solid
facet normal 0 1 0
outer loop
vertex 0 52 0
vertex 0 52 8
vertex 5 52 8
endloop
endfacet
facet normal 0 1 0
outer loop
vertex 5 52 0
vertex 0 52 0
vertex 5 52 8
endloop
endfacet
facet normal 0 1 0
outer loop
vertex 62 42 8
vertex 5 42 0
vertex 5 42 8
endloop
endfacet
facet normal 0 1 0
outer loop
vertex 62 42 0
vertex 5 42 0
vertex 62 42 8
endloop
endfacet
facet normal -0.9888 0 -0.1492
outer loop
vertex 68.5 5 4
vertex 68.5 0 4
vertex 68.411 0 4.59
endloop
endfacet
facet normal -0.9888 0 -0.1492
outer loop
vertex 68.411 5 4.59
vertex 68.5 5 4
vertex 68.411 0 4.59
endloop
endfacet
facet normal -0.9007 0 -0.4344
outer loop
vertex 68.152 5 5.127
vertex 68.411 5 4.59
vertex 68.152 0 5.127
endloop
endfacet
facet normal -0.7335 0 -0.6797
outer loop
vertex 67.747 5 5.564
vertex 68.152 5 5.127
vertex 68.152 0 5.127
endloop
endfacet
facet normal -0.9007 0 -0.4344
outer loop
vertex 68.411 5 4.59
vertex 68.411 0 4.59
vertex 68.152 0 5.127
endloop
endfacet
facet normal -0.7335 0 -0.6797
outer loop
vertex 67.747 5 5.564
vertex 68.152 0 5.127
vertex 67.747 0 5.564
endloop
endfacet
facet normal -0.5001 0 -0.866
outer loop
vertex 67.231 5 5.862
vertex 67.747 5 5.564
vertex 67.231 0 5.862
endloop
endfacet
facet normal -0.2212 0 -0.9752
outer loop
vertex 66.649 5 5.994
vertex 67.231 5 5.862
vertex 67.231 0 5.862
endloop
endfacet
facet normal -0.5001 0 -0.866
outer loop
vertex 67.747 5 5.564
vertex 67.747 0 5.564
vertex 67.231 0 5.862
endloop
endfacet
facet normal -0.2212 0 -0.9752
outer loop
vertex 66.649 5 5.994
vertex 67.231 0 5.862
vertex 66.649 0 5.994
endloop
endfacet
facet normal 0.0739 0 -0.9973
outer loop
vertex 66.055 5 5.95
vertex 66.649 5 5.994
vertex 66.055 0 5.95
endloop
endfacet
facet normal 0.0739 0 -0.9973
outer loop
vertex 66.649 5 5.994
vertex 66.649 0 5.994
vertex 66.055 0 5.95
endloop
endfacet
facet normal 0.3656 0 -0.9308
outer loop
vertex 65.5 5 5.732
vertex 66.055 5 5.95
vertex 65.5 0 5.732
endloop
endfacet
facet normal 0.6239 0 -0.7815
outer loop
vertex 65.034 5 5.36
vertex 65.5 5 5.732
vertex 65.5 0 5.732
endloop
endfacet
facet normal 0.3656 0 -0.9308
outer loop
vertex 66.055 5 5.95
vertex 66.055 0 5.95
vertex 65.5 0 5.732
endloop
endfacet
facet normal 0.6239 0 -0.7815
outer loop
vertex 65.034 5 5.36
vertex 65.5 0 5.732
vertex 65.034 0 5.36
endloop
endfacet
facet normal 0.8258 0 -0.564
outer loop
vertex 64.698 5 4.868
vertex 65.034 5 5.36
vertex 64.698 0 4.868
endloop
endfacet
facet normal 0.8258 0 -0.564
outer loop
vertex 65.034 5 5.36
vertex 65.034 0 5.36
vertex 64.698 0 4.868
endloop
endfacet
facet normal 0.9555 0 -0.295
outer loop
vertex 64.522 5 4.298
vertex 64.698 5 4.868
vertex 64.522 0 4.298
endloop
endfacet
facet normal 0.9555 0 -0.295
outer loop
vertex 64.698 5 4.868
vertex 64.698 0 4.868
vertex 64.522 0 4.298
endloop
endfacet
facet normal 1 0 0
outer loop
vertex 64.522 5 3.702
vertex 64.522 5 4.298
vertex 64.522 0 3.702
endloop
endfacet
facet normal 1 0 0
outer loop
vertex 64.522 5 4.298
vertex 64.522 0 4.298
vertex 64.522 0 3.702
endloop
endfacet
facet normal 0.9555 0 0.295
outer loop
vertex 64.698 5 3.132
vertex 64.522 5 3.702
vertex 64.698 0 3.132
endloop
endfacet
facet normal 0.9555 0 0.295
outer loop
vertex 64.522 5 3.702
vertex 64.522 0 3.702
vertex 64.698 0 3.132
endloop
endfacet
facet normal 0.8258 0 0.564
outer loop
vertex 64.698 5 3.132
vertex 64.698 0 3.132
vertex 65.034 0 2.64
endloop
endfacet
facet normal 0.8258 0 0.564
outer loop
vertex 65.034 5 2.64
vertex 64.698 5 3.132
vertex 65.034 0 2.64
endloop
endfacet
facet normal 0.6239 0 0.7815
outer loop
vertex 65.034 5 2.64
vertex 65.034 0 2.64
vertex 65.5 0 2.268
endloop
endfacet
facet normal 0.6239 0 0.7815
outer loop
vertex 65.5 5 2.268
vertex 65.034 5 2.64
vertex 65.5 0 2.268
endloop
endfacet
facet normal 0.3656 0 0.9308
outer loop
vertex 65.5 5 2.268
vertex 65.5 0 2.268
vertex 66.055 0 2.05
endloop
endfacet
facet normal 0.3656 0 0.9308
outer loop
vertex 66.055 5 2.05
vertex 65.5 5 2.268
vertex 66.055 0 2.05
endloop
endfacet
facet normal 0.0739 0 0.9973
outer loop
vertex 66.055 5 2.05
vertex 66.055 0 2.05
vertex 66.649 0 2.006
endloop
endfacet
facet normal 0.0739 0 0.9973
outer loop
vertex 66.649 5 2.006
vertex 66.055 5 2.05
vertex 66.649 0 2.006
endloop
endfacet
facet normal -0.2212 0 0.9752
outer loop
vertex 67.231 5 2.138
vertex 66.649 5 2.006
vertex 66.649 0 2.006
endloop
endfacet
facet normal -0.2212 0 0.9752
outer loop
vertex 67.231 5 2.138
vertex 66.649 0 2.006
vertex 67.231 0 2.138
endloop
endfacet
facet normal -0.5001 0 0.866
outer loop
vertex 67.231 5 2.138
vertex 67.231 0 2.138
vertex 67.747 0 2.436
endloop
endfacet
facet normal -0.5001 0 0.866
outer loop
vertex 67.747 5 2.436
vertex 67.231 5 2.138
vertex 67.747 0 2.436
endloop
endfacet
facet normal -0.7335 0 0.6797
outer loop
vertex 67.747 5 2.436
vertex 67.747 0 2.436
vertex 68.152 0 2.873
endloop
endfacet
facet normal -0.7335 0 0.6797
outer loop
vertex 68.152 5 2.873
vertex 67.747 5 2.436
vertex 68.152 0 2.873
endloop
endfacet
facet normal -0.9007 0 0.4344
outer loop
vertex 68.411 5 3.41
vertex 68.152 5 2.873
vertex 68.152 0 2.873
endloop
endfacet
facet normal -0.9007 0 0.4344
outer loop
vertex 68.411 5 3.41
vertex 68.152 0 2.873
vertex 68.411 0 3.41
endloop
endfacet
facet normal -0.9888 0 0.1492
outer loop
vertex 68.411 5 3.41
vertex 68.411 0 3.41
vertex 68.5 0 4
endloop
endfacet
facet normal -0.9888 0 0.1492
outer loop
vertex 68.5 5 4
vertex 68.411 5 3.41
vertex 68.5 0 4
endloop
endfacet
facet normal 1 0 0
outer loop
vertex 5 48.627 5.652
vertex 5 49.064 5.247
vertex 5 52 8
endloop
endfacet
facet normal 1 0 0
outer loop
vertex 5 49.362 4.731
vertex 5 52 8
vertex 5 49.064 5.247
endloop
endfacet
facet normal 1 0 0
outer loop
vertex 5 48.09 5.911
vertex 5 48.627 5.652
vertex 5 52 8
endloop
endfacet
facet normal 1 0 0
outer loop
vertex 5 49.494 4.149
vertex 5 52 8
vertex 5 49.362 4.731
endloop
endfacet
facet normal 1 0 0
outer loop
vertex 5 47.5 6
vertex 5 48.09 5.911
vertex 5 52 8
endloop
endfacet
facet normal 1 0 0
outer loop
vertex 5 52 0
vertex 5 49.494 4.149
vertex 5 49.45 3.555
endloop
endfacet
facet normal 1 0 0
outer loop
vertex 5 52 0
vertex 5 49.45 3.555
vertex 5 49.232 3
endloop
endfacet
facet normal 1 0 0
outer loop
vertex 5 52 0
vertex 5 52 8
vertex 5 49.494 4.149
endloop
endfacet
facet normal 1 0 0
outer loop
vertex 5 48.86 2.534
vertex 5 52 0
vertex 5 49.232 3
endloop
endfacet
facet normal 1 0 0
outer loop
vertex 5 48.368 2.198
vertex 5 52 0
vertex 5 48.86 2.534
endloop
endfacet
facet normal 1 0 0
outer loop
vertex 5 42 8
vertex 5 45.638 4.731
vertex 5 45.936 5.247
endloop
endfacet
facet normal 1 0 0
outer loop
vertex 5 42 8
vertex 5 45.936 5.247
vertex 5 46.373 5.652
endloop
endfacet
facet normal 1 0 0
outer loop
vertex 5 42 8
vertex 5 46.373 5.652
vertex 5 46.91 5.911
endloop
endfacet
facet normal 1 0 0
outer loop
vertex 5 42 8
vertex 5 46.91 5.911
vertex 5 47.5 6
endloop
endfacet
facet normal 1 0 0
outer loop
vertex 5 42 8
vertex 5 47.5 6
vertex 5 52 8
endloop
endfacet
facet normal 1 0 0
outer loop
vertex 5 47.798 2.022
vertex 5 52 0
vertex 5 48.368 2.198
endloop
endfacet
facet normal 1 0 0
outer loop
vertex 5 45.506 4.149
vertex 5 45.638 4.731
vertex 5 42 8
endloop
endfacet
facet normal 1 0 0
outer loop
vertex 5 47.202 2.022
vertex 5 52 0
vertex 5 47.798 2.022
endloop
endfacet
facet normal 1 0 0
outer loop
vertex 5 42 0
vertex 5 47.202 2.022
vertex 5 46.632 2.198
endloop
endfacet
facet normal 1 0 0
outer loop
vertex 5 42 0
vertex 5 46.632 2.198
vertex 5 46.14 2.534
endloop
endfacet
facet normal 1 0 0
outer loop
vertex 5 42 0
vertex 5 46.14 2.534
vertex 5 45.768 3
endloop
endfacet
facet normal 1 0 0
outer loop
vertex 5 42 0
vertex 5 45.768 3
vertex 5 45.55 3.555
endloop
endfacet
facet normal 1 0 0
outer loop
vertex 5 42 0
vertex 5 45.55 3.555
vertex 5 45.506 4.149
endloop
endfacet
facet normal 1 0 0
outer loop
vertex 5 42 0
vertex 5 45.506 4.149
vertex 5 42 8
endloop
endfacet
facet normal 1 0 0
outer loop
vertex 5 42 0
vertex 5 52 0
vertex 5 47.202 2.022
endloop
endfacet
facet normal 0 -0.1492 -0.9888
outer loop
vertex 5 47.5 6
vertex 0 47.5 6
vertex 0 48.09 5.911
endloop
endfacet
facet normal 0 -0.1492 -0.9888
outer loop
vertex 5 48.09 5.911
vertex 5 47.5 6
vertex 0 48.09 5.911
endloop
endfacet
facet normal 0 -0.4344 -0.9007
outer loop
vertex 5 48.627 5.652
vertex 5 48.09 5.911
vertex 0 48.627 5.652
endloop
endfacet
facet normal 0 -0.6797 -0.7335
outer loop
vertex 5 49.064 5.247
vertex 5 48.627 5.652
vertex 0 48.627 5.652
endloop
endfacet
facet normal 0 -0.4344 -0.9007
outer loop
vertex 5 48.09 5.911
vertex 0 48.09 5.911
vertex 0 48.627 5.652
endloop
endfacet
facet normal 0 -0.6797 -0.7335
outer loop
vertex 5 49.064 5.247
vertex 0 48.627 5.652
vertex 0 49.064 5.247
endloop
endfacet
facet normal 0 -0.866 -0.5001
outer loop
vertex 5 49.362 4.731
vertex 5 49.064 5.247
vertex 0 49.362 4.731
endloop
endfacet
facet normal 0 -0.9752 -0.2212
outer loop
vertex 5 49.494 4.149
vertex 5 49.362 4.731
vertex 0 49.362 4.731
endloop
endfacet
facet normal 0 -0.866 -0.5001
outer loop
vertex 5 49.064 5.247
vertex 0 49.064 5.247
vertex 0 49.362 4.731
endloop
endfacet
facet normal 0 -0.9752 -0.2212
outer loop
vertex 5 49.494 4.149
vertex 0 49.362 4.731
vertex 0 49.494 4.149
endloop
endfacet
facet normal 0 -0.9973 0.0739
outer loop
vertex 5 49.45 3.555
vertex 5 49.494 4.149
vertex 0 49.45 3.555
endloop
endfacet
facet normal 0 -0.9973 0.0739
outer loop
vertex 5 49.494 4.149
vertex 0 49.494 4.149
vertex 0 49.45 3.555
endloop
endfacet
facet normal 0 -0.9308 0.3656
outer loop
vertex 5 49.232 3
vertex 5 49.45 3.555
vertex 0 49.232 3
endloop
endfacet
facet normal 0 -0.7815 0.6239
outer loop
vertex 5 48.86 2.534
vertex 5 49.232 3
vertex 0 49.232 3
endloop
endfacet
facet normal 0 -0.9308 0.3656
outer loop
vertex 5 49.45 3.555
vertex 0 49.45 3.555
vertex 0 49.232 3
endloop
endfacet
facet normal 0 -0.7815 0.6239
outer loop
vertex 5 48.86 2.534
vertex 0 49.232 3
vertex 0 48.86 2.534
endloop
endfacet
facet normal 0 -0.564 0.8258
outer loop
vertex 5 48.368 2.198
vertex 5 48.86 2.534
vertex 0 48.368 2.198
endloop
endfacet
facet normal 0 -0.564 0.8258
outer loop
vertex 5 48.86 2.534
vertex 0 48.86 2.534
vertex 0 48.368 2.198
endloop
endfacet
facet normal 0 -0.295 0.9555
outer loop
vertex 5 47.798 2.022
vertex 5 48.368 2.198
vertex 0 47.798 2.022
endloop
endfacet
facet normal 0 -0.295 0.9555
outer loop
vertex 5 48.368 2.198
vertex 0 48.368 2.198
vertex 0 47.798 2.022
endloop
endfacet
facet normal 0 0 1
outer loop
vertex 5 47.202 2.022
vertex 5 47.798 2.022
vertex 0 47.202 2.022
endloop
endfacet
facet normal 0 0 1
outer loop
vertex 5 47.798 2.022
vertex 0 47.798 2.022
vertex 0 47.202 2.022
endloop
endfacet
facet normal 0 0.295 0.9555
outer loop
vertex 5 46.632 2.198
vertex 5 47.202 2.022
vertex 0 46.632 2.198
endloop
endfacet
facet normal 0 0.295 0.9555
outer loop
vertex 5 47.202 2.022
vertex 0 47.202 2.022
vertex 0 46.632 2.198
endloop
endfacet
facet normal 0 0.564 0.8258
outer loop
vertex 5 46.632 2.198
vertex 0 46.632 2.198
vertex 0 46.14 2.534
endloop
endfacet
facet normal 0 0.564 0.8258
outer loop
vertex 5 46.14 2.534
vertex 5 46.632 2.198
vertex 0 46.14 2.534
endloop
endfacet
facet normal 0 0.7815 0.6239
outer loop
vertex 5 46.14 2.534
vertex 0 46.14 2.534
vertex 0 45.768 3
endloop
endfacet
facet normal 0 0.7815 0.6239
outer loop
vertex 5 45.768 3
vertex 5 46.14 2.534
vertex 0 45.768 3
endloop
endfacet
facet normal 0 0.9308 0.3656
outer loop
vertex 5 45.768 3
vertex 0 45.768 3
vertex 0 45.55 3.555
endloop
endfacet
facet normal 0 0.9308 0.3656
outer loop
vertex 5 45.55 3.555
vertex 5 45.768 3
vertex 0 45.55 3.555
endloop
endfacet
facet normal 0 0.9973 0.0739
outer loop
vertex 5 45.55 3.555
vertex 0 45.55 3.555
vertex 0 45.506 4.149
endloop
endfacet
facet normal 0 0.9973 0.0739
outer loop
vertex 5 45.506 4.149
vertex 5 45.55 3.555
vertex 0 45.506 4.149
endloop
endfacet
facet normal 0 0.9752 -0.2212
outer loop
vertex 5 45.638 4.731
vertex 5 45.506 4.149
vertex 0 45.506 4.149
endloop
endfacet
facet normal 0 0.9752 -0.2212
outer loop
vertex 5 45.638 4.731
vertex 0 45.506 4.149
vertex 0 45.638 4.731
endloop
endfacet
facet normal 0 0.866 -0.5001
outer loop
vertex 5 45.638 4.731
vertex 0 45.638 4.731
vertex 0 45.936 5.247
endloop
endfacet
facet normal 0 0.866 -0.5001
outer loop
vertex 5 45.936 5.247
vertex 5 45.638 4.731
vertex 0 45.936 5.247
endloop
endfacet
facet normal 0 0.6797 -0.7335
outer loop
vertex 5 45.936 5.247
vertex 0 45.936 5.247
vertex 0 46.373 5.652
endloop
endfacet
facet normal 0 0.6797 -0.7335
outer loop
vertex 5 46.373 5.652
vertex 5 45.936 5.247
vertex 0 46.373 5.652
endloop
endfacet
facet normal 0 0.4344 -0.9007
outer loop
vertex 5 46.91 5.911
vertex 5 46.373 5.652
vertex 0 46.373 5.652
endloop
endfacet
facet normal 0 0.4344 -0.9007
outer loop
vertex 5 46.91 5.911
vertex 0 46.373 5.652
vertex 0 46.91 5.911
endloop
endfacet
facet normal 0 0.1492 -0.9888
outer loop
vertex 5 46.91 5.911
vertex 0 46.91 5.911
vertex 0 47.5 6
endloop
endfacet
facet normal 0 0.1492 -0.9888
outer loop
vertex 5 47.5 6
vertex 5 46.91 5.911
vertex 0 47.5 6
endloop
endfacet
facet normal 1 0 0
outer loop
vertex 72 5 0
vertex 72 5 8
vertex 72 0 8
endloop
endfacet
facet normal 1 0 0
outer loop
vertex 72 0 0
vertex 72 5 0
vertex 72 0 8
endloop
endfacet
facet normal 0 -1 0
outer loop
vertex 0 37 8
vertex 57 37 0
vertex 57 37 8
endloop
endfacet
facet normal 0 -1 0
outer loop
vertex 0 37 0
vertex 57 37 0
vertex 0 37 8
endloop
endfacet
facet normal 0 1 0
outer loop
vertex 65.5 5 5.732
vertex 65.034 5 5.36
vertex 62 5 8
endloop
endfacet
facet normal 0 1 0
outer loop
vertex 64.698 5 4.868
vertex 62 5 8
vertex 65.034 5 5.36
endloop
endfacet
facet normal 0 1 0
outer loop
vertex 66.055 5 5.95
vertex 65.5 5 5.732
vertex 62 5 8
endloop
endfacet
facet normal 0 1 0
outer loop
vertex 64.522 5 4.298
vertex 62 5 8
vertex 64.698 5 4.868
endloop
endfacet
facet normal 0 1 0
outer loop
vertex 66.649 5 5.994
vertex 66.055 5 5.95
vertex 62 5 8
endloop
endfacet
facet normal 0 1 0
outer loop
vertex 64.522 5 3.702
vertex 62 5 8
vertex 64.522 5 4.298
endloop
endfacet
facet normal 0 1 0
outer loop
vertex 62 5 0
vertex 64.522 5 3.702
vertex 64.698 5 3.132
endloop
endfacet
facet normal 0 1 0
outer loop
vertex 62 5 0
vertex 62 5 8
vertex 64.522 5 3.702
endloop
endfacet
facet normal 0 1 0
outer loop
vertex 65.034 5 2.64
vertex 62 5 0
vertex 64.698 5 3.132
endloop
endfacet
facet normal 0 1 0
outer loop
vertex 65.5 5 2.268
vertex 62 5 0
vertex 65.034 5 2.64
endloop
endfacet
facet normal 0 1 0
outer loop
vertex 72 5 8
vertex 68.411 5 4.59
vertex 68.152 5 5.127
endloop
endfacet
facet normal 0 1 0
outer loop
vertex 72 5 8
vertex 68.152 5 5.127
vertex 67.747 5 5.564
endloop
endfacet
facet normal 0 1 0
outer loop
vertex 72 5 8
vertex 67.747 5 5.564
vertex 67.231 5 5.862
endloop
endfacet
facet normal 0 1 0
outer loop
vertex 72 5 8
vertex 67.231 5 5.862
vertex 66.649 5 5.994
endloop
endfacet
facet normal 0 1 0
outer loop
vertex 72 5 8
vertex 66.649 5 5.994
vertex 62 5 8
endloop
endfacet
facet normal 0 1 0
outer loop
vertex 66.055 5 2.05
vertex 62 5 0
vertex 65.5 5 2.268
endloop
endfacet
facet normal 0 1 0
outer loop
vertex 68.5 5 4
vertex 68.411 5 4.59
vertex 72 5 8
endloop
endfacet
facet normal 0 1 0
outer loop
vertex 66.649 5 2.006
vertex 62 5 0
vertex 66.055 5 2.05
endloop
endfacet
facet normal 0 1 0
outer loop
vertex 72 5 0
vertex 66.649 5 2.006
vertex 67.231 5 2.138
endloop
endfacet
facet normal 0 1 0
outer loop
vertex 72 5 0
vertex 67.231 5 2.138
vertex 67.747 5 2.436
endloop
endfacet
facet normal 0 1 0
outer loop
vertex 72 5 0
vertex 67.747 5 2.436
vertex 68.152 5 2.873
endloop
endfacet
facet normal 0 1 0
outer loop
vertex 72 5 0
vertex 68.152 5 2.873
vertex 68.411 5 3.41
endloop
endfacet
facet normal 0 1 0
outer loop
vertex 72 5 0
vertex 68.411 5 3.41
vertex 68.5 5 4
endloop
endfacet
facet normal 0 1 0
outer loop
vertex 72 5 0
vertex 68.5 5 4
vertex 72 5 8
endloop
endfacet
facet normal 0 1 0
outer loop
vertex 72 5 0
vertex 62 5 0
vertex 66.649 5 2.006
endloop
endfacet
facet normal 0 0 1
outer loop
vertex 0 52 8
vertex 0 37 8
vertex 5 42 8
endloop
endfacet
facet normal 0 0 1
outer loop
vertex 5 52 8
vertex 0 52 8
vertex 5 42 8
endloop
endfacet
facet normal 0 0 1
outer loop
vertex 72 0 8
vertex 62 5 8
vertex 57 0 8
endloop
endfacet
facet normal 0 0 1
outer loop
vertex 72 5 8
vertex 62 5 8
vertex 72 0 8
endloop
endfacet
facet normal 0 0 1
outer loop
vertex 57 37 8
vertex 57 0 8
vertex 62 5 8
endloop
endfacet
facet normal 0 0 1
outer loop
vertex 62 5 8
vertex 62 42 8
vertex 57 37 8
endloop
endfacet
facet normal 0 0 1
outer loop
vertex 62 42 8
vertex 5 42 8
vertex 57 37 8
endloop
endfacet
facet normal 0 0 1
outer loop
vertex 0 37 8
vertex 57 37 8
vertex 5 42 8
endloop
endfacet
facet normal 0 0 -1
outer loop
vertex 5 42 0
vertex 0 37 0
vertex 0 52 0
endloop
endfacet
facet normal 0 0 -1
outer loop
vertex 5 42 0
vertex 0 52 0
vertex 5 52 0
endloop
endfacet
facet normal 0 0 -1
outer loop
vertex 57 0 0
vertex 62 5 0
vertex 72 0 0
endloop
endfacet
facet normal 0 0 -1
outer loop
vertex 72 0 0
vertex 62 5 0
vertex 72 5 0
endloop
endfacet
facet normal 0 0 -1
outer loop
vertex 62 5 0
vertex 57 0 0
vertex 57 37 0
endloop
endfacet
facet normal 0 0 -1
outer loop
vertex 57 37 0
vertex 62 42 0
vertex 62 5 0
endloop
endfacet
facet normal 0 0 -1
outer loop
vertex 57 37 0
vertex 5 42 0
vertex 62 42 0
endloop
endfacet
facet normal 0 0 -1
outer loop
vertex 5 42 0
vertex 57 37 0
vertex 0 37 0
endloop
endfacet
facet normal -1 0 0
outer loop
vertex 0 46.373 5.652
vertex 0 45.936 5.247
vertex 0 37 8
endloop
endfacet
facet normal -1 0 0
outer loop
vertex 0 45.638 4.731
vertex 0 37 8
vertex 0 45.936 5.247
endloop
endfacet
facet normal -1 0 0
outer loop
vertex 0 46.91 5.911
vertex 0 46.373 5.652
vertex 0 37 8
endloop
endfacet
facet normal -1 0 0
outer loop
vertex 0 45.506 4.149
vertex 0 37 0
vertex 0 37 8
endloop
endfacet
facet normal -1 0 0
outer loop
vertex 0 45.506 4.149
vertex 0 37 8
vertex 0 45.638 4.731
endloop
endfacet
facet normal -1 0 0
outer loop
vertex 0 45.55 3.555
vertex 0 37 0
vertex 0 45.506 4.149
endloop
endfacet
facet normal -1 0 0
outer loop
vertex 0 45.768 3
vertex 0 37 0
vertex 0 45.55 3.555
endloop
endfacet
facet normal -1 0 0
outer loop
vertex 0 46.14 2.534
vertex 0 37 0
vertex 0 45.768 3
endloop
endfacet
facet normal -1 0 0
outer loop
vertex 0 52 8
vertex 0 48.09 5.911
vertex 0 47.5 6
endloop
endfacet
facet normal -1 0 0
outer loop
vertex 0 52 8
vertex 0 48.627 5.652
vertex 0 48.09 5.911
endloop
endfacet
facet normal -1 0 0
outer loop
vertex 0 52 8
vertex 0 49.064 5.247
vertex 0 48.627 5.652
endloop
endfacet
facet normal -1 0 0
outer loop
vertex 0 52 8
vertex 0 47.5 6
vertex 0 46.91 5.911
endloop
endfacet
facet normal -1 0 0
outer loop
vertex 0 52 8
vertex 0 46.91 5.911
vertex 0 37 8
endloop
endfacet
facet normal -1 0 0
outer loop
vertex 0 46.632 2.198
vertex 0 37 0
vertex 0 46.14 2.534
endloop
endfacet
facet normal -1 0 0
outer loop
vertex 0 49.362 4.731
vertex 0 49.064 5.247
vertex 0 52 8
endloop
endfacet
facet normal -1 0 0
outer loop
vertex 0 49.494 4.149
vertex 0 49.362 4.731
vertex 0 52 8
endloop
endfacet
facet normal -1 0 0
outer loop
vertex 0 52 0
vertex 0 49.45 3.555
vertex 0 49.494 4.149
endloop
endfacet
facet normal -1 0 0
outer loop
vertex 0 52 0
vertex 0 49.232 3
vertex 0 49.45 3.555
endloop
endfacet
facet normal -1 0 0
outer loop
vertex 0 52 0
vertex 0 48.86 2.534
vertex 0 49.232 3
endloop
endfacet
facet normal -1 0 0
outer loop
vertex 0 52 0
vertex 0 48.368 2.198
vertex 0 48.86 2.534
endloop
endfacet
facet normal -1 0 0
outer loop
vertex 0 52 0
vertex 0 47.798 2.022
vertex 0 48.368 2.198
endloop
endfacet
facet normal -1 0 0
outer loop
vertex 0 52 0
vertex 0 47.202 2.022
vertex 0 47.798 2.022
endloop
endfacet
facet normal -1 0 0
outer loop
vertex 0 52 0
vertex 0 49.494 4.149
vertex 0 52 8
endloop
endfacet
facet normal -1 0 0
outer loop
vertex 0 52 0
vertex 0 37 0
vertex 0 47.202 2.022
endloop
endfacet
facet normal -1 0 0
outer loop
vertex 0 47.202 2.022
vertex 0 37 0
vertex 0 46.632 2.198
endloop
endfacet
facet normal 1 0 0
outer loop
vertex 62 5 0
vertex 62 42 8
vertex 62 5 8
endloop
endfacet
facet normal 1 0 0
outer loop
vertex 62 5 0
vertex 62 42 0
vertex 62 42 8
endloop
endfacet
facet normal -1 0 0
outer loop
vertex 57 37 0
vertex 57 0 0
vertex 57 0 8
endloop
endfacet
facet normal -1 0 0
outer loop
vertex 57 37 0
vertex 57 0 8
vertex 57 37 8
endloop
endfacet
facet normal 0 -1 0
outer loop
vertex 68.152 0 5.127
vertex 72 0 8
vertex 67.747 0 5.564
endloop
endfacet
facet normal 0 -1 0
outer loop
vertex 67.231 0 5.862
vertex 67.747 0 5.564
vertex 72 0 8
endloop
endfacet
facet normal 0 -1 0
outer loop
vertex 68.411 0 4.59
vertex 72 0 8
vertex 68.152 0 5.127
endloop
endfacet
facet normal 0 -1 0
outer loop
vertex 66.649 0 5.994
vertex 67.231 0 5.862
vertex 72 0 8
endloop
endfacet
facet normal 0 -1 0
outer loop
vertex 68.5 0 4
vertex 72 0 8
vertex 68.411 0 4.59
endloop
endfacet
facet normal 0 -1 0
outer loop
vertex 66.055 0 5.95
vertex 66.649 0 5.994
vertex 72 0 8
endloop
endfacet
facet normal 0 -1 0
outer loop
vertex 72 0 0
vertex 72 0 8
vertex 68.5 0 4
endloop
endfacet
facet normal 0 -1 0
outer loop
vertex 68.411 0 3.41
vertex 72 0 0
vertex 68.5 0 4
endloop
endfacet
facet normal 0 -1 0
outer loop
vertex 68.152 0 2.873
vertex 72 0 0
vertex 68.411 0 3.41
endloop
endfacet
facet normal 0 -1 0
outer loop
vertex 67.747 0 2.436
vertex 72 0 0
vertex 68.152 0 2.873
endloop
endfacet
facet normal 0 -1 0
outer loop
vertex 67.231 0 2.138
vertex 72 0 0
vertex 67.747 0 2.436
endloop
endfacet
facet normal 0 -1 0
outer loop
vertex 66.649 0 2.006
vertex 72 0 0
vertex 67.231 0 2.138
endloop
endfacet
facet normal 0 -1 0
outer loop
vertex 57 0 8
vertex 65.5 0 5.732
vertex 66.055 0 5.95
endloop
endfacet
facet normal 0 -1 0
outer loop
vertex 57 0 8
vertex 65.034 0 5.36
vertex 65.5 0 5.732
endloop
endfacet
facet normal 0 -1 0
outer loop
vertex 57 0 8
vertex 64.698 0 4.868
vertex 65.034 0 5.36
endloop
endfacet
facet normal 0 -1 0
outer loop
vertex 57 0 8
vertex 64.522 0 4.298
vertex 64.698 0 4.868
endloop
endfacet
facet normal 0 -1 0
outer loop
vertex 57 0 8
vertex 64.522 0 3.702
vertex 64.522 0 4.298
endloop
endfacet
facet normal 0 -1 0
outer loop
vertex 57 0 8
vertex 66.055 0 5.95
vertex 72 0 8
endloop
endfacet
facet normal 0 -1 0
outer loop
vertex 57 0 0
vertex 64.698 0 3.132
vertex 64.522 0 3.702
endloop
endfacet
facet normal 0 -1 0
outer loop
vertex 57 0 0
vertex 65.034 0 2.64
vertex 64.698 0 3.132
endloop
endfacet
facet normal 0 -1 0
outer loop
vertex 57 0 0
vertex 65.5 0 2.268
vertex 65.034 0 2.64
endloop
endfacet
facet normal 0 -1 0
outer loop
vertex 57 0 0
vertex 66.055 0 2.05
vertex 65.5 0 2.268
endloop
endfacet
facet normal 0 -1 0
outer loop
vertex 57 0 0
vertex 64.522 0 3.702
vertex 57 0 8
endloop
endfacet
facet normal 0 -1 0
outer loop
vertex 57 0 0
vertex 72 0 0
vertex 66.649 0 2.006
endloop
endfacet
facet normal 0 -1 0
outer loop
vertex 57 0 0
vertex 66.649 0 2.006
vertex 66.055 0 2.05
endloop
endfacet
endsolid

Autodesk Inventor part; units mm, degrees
ref_plane "YZ Plane" through (0, 0, 0) normal (1, 0, 0) x (0, 1, 0)
ref_plane "XZ Plane" through (0, 0, 0) normal (0, 1, 0) x (-1, 0, 0)
ref_plane "XY Plane" through (0, 0, 0) normal (0, 0, 1) x (1, 0, 0)
sketch "Sketch1" plane through (0, 0, 0) normal (0, 0, 1) x (1, 0, 0)
  line L0 (0, 37) -> (0, 52)
  line L1 (0, 52) -> (5, 52)
  line L2 (5, 52) -> (5, 42)
  line L3 (5, 42) -> (62, 42)
  line L4 (62, 42) -> (62, 5)
  line L5 (62, 5) -> (72, 5)
  line L6 (72, 5) -> (72, 0)
  line L7 (72, 0) -> (57, 0)
  line L8 (57, 0) -> (57, 37)
  line L9 (57, 37) -> (0, 37)
  point P0 (0, 0)
  dimension "d0" = 37
  dimension "d1" = 57
  dimension "d2" = 5
  dimension "d3" = 5
  dimension "d4" = 5
  dimension "d5" = 5
  dimension "d6" = 15
  dimension "d7" = 15
extrude "Extrusion1" add sketch "Sketch1" along normal blind 8
sketch "Sketch2" plane through (0, 37, 0) normal (-1, 0, 0) x (0, 0, 1)
  circle A0 centre (4, 10.5) radius 2
  line L0 (0, 15) -> (8, 15) projected
  point P0 (0, -37)
  point P1 (4, 15)
  dimension "d10" = 4
  dimension "d11" = 4.5
extrude "Extrusion2" cut sketch "Sketch2" against normal up to next
sketch "Sketch3" plane through (57, 0, 0) normal (0, -1, 0) x (1, 0, 0)
  circle A0 centre (9.5, 4) radius 2
  line L0 (15, 0) -> (15, 8) projected
  point P0 (-57, 0)
  point P1 (15, 4)
  dimension "d14" = 4
  dimension "d15" = 5.5
extrude "Extrusion3" cut sketch "Sketch3" against normal up to next
equation "\"d3\" = d2"
equation "\"d4\" = d2"
equation "\"d5\" = d2"
properties material "ABS Plastic"
